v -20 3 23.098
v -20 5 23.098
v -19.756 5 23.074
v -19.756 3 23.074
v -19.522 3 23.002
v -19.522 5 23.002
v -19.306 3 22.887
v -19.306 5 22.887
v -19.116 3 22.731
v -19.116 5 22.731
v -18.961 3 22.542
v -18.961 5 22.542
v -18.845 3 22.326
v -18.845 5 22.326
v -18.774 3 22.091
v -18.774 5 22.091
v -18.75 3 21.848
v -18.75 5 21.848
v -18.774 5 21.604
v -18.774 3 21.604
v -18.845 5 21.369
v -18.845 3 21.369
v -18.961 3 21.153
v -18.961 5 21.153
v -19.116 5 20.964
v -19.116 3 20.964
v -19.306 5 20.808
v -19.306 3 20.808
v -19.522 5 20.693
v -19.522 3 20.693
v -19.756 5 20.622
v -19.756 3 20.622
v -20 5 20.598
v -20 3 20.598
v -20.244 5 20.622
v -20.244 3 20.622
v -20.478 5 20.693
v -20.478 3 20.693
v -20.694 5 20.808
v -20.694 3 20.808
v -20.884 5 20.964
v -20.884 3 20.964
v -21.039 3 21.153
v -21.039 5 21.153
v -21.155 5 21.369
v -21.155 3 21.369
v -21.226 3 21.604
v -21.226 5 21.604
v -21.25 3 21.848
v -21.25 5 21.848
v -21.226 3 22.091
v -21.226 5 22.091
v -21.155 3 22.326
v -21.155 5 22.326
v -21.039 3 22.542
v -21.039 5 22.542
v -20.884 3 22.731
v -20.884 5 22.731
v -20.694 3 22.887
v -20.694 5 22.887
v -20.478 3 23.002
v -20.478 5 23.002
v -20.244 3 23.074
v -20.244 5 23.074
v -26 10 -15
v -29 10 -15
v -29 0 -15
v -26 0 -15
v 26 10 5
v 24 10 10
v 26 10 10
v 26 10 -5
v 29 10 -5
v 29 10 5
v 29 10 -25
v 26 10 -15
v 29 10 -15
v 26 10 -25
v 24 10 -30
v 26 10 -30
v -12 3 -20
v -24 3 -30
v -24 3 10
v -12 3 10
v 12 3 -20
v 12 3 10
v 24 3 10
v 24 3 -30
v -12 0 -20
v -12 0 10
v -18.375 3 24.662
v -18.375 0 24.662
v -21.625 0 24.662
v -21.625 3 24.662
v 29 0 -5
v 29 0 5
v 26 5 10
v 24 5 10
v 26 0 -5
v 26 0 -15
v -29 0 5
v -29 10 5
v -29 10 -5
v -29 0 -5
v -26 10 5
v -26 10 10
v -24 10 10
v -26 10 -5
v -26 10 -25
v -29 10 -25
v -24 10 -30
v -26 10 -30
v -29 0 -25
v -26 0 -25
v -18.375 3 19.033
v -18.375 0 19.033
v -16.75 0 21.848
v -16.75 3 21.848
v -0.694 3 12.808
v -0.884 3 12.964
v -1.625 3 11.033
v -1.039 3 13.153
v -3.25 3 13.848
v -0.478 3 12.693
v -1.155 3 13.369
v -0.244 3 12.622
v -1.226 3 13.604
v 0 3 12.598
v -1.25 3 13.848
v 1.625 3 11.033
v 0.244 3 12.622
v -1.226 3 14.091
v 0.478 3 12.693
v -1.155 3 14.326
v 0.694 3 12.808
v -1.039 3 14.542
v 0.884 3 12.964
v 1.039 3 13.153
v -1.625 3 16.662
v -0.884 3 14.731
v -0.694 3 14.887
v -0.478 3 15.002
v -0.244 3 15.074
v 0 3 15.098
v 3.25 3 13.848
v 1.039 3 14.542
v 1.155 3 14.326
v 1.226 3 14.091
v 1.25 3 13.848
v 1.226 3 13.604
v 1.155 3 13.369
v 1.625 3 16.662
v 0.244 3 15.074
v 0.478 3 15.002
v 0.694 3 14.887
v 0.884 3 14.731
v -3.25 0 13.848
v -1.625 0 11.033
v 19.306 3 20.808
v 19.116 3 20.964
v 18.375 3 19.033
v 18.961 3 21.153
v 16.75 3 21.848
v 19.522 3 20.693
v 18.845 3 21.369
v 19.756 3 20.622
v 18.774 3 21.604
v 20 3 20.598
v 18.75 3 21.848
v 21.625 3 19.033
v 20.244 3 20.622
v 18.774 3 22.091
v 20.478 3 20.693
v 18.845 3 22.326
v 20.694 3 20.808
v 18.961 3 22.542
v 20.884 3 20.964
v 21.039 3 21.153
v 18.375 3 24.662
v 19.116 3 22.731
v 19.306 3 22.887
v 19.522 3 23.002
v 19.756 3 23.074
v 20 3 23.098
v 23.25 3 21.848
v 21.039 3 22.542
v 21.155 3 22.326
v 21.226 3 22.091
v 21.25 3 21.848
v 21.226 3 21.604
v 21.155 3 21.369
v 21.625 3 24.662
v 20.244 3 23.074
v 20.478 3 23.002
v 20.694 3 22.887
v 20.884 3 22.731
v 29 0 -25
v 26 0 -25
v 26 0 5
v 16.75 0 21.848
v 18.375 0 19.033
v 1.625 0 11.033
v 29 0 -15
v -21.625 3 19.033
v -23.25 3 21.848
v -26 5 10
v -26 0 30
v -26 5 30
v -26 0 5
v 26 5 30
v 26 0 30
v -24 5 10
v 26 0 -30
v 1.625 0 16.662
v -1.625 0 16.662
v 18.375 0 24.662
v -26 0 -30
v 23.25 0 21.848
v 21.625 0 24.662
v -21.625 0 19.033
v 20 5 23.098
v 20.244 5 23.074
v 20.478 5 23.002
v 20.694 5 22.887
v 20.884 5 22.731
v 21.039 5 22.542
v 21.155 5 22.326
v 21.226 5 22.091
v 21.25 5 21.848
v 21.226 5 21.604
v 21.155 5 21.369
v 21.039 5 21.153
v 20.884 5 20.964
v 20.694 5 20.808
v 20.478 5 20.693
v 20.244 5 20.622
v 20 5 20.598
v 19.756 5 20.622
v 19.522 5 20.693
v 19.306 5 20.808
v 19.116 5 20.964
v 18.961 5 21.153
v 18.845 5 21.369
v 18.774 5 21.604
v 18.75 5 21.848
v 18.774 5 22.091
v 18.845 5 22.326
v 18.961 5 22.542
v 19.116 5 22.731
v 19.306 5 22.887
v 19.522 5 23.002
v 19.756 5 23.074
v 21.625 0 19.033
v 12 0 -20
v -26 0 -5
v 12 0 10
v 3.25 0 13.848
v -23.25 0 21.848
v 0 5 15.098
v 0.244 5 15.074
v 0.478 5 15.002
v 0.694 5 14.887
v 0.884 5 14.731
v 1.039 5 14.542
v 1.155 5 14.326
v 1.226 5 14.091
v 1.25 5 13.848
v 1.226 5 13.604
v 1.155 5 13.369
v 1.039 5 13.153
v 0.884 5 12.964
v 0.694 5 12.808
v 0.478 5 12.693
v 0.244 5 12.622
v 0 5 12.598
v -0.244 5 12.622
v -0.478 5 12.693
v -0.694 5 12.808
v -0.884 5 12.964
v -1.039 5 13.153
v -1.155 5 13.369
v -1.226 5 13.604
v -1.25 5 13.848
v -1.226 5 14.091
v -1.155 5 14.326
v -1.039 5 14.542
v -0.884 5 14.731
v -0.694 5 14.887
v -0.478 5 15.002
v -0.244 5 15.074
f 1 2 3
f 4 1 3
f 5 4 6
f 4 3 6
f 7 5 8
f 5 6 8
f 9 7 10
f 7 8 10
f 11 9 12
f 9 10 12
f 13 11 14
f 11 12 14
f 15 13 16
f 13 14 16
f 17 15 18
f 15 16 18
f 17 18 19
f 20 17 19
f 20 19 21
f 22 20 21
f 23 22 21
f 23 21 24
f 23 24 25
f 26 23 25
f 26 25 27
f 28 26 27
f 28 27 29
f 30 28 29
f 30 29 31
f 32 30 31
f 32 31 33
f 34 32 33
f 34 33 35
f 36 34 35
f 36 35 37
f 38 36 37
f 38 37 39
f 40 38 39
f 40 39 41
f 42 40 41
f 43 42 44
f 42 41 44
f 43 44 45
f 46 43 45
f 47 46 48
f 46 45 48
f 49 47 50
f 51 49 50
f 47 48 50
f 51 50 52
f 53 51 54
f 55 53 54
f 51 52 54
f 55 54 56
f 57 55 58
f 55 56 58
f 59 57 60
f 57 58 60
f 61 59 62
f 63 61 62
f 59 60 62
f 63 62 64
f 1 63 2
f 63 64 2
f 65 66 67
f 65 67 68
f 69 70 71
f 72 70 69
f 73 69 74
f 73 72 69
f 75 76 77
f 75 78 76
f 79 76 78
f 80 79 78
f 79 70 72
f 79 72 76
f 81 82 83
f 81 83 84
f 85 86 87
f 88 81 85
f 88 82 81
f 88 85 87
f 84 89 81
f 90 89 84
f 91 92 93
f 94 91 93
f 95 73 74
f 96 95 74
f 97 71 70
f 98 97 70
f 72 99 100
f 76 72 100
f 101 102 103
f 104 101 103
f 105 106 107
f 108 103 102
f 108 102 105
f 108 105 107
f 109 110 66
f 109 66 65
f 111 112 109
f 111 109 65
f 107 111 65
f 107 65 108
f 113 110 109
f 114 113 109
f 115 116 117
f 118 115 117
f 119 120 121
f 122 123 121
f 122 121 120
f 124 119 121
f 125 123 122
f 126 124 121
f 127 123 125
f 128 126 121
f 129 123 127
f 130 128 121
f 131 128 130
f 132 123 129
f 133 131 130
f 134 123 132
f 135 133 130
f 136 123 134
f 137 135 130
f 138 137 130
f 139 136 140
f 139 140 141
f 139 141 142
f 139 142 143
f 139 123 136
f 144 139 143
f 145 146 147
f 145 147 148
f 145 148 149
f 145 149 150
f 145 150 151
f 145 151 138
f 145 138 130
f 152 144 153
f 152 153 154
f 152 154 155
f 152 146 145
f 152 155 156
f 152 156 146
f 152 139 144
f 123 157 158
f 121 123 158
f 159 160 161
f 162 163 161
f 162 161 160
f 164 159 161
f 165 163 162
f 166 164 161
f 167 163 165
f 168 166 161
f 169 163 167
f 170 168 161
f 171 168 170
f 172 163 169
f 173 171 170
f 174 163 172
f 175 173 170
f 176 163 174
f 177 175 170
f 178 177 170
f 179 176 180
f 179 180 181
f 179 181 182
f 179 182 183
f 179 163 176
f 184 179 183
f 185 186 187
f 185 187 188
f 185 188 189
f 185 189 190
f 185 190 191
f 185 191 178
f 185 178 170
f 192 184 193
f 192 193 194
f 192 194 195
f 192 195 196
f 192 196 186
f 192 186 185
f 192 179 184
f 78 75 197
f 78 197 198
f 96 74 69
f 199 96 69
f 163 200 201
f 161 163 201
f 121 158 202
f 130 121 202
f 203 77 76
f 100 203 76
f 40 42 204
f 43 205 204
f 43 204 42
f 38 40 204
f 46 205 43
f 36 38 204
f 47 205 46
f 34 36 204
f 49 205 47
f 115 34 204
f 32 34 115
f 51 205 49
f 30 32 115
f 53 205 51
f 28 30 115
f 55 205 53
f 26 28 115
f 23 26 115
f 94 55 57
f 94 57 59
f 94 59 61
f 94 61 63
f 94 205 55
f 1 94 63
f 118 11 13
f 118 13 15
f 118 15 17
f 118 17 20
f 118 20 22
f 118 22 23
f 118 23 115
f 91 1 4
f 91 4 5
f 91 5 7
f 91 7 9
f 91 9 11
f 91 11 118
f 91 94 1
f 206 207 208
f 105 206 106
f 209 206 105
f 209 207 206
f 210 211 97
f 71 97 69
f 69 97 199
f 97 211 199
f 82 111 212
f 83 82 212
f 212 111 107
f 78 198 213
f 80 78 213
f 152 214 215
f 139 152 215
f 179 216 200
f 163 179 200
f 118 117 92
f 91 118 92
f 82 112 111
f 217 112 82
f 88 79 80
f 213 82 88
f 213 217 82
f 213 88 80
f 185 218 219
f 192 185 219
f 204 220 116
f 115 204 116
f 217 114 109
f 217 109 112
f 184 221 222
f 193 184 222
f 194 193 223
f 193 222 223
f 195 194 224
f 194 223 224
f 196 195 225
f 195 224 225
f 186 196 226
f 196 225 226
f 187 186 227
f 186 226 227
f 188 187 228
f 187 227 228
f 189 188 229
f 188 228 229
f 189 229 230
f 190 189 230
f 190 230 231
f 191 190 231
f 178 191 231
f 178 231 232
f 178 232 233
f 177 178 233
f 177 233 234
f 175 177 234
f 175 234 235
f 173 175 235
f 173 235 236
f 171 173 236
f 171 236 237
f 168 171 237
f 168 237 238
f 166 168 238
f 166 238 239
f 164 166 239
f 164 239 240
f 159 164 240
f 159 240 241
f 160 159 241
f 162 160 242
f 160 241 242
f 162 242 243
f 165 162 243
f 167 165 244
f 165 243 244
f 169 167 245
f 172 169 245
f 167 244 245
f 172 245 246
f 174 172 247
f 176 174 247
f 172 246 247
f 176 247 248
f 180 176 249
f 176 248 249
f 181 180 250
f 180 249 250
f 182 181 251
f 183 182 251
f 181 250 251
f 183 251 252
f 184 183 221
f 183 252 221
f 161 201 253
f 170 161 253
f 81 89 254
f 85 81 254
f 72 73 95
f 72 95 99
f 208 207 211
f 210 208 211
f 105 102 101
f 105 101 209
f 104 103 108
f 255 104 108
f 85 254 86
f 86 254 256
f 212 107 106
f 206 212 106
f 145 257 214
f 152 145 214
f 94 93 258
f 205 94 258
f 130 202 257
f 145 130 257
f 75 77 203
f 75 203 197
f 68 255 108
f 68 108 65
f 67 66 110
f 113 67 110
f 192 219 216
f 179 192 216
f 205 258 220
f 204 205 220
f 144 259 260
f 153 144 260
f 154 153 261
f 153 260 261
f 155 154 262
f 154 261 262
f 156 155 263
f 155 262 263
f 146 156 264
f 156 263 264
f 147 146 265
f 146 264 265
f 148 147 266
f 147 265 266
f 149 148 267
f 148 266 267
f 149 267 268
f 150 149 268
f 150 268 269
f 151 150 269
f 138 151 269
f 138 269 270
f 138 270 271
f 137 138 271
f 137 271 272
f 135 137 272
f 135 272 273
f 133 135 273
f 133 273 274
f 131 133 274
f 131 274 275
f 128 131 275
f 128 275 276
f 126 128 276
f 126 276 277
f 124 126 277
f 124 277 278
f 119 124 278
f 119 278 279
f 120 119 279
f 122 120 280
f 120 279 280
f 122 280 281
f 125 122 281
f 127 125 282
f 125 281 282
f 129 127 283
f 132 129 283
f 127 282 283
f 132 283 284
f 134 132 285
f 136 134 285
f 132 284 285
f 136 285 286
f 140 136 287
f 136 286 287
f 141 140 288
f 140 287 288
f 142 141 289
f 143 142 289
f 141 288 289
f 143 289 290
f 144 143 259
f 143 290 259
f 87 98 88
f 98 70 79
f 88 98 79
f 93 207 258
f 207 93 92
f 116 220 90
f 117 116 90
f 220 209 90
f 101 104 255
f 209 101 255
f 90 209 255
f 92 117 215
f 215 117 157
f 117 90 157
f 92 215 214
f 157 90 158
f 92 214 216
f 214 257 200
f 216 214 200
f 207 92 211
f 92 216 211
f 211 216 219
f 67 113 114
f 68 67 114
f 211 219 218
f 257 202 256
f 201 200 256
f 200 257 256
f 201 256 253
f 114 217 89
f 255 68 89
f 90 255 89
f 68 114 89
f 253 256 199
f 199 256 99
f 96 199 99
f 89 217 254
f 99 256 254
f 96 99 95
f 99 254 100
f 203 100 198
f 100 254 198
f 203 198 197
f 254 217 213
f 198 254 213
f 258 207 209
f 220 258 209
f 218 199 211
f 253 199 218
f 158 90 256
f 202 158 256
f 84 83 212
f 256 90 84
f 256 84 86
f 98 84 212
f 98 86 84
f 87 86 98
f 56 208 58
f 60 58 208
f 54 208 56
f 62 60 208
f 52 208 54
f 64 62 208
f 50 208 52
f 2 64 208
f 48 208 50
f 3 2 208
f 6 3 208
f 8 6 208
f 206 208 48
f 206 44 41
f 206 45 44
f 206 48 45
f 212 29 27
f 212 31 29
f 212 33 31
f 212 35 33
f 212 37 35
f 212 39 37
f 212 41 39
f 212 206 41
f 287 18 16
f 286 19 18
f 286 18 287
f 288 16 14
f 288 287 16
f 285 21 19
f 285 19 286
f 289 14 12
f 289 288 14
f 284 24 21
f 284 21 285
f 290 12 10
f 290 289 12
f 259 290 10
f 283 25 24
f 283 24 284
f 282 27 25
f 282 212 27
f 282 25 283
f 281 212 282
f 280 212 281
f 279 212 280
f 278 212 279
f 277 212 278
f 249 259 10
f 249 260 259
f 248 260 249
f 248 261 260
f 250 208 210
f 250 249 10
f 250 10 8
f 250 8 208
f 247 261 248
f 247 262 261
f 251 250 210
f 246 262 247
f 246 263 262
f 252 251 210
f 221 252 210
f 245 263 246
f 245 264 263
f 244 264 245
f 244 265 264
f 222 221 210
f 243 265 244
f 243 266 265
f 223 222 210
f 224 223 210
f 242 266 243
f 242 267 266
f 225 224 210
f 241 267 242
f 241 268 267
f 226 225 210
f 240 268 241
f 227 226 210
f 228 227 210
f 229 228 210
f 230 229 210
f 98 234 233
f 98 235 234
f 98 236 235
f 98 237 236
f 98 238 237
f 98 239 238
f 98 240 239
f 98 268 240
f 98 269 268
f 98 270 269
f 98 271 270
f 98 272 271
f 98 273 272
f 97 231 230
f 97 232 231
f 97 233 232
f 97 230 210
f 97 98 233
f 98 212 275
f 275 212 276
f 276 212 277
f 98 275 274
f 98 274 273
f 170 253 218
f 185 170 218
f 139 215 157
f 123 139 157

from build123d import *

# Parameters (mm, degrees)
SKETCH1_W               = 52
SKETCH1_H               = 60
BOSS_EXTRUDE1_DEPTH     = 10
CUT_EXTRUDE1_DEPTH      = 5
SKETCH3_R               = 1.25
CUT_EXTRUDE2_DEPTH      = 5
CUT_EXTRUDE3_DEPTH      = 3
SKETCH6_W               = 24
SKETCH6_H               = 30
CUT_EXTRUDE4_DEPTH      = 41.938978981
SKETCH7_W               = 3
SKETCH7_H               = 10
BOSS_EXTRUDE2_DEPTH     = 10
LPATTERN1_COUNT         = 2
LPATTERN1_PITCH         = 20
MIRROR1_COPY_1_SKETCH_W = 3
MIRROR1_COPY_1_SKETCH_H = 10
MIRROR1_COPY_1_DEPTH    = 10
SKETCH8_W               = 48
SKETCH8_H               = 40
CUT_EXTRUDE5_DEPTH      = 2


with BuildPart() as part:
    # Sketch1 → Boss-Extrude1 (new body)
    with BuildSketch(Plane(origin=(0, 0, 0), x_dir=(1, 0, 0), z_dir=(0, 1, 0))):
        Rectangle(SKETCH1_W, SKETCH1_H)
    extrude(amount=BOSS_EXTRUDE1_DEPTH)

    # Sketch2 → Cut-Extrude1 (cut)
    with BuildSketch(Plane(origin=(0, 10, 0), x_dir=(1, 0, 0), z_dir=(0, 1, 0))):
        Polygon((-26, -30), (26, -30), (26, -10), (24, -10), (24, 30), (-24, 30), (-24, -10), (-26, -10), align=None)
    extrude(amount=-CUT_EXTRUDE1_DEPTH, mode=Mode.SUBTRACT)

    # Sketch3 → Cut-Extrude2 (cut)
    with BuildSketch(Plane(origin=(0, 5, 0), x_dir=(1, 0, 0), z_dir=(0, 1, 0))):
        with Locations(Location((-20, -21.847557332, 0), (0, 0, 270))):
            Circle(SKETCH3_R)
        with Locations(Location((0, -13.847557332, 0), (0, 0, 270))):
            Circle(SKETCH3_R)
        with Locations(Location((20, -21.847557332, 0), (0, 0, 270))):
            Circle(SKETCH3_R)
    extrude(amount=-CUT_EXTRUDE2_DEPTH, mode=Mode.SUBTRACT)

    # Sketch5 → Cut-Extrude3 (cut)
    with BuildSketch(Plane.XZ):
        Polygon((-18.375, 24.662139894), (-21.625, 24.662139894), (-23.25, 21.847557332), (-21.625, 19.03297477), (-18.375, 19.03297477), (-16.75, 21.847557332), align=None)
        Polygon((1.625, 16.662139894), (-1.625, 16.662139894), (-3.25, 13.847557332), (-1.625, 11.03297477), (1.625, 11.03297477), (3.25, 13.847557332), align=None)
        Polygon((21.625, 24.662139894), (18.375, 24.662139894), (16.75, 21.847557332), (18.375, 19.03297477), (21.625, 19.03297477), (23.25, 21.847557332), align=None)
    extrude(amount=-CUT_EXTRUDE3_DEPTH, mode=Mode.SUBTRACT)

    # Sketch6 → Cut-Extrude4 (cut, through all)
    with BuildSketch(Plane.XZ):
        with Locations((0, -5)):
            Rectangle(SKETCH6_W, SKETCH6_H)
    extrude(amount=-CUT_EXTRUDE4_DEPTH, mode=Mode.SUBTRACT)

    # Sketch7 → Boss-Extrude2 (add)
    with BuildSketch(Plane(origin=(0, 10, 0), x_dir=(1, 0, 0), z_dir=(0, 1, 0))):
        with Locations((-27.5, 20)):
            Rectangle(SKETCH7_W, SKETCH7_H)
    boss_extrude2 = extrude(amount=-BOSS_EXTRUDE2_DEPTH)

    # LPattern1: Boss-Extrude2 ×2
    with Locations(*[(0, 0, i * LPATTERN1_PITCH) for i in range(1, LPATTERN1_COUNT)]):
        add(boss_extrude2)

    # Mirror1: Boss-Extrude2 across plane
    add(boss_extrude2.mirror(Plane(origin=(0, 0, 0), x_dir=(0, 0, 1), z_dir=(1, 0, 0))))

    # Mirror1 copy 1 sketch → Mirror1 copy 1 (add)
    with BuildSketch(Plane(origin=(0, 10, 20), x_dir=(-1, 0, 0), z_dir=(0, 1, 0))):
        with Locations((-27.5, -20)):
            Rectangle(MIRROR1_COPY_1_SKETCH_W, MIRROR1_COPY_1_SKETCH_H)
    extrude(amount=-MIRROR1_COPY_1_DEPTH)

    # Sketch8 → Cut-Extrude5 (cut)
    with BuildSketch(Plane(origin=(0, 5, 0), x_dir=(1, 0, 0), z_dir=(0, 1, 0))):
        with Locations((0, 10)):
            Rectangle(SKETCH8_W, SKETCH8_H)
    extrude(amount=-CUT_EXTRUDE5_DEPTH, mode=Mode.SUBTRACT)


solid = part.part
